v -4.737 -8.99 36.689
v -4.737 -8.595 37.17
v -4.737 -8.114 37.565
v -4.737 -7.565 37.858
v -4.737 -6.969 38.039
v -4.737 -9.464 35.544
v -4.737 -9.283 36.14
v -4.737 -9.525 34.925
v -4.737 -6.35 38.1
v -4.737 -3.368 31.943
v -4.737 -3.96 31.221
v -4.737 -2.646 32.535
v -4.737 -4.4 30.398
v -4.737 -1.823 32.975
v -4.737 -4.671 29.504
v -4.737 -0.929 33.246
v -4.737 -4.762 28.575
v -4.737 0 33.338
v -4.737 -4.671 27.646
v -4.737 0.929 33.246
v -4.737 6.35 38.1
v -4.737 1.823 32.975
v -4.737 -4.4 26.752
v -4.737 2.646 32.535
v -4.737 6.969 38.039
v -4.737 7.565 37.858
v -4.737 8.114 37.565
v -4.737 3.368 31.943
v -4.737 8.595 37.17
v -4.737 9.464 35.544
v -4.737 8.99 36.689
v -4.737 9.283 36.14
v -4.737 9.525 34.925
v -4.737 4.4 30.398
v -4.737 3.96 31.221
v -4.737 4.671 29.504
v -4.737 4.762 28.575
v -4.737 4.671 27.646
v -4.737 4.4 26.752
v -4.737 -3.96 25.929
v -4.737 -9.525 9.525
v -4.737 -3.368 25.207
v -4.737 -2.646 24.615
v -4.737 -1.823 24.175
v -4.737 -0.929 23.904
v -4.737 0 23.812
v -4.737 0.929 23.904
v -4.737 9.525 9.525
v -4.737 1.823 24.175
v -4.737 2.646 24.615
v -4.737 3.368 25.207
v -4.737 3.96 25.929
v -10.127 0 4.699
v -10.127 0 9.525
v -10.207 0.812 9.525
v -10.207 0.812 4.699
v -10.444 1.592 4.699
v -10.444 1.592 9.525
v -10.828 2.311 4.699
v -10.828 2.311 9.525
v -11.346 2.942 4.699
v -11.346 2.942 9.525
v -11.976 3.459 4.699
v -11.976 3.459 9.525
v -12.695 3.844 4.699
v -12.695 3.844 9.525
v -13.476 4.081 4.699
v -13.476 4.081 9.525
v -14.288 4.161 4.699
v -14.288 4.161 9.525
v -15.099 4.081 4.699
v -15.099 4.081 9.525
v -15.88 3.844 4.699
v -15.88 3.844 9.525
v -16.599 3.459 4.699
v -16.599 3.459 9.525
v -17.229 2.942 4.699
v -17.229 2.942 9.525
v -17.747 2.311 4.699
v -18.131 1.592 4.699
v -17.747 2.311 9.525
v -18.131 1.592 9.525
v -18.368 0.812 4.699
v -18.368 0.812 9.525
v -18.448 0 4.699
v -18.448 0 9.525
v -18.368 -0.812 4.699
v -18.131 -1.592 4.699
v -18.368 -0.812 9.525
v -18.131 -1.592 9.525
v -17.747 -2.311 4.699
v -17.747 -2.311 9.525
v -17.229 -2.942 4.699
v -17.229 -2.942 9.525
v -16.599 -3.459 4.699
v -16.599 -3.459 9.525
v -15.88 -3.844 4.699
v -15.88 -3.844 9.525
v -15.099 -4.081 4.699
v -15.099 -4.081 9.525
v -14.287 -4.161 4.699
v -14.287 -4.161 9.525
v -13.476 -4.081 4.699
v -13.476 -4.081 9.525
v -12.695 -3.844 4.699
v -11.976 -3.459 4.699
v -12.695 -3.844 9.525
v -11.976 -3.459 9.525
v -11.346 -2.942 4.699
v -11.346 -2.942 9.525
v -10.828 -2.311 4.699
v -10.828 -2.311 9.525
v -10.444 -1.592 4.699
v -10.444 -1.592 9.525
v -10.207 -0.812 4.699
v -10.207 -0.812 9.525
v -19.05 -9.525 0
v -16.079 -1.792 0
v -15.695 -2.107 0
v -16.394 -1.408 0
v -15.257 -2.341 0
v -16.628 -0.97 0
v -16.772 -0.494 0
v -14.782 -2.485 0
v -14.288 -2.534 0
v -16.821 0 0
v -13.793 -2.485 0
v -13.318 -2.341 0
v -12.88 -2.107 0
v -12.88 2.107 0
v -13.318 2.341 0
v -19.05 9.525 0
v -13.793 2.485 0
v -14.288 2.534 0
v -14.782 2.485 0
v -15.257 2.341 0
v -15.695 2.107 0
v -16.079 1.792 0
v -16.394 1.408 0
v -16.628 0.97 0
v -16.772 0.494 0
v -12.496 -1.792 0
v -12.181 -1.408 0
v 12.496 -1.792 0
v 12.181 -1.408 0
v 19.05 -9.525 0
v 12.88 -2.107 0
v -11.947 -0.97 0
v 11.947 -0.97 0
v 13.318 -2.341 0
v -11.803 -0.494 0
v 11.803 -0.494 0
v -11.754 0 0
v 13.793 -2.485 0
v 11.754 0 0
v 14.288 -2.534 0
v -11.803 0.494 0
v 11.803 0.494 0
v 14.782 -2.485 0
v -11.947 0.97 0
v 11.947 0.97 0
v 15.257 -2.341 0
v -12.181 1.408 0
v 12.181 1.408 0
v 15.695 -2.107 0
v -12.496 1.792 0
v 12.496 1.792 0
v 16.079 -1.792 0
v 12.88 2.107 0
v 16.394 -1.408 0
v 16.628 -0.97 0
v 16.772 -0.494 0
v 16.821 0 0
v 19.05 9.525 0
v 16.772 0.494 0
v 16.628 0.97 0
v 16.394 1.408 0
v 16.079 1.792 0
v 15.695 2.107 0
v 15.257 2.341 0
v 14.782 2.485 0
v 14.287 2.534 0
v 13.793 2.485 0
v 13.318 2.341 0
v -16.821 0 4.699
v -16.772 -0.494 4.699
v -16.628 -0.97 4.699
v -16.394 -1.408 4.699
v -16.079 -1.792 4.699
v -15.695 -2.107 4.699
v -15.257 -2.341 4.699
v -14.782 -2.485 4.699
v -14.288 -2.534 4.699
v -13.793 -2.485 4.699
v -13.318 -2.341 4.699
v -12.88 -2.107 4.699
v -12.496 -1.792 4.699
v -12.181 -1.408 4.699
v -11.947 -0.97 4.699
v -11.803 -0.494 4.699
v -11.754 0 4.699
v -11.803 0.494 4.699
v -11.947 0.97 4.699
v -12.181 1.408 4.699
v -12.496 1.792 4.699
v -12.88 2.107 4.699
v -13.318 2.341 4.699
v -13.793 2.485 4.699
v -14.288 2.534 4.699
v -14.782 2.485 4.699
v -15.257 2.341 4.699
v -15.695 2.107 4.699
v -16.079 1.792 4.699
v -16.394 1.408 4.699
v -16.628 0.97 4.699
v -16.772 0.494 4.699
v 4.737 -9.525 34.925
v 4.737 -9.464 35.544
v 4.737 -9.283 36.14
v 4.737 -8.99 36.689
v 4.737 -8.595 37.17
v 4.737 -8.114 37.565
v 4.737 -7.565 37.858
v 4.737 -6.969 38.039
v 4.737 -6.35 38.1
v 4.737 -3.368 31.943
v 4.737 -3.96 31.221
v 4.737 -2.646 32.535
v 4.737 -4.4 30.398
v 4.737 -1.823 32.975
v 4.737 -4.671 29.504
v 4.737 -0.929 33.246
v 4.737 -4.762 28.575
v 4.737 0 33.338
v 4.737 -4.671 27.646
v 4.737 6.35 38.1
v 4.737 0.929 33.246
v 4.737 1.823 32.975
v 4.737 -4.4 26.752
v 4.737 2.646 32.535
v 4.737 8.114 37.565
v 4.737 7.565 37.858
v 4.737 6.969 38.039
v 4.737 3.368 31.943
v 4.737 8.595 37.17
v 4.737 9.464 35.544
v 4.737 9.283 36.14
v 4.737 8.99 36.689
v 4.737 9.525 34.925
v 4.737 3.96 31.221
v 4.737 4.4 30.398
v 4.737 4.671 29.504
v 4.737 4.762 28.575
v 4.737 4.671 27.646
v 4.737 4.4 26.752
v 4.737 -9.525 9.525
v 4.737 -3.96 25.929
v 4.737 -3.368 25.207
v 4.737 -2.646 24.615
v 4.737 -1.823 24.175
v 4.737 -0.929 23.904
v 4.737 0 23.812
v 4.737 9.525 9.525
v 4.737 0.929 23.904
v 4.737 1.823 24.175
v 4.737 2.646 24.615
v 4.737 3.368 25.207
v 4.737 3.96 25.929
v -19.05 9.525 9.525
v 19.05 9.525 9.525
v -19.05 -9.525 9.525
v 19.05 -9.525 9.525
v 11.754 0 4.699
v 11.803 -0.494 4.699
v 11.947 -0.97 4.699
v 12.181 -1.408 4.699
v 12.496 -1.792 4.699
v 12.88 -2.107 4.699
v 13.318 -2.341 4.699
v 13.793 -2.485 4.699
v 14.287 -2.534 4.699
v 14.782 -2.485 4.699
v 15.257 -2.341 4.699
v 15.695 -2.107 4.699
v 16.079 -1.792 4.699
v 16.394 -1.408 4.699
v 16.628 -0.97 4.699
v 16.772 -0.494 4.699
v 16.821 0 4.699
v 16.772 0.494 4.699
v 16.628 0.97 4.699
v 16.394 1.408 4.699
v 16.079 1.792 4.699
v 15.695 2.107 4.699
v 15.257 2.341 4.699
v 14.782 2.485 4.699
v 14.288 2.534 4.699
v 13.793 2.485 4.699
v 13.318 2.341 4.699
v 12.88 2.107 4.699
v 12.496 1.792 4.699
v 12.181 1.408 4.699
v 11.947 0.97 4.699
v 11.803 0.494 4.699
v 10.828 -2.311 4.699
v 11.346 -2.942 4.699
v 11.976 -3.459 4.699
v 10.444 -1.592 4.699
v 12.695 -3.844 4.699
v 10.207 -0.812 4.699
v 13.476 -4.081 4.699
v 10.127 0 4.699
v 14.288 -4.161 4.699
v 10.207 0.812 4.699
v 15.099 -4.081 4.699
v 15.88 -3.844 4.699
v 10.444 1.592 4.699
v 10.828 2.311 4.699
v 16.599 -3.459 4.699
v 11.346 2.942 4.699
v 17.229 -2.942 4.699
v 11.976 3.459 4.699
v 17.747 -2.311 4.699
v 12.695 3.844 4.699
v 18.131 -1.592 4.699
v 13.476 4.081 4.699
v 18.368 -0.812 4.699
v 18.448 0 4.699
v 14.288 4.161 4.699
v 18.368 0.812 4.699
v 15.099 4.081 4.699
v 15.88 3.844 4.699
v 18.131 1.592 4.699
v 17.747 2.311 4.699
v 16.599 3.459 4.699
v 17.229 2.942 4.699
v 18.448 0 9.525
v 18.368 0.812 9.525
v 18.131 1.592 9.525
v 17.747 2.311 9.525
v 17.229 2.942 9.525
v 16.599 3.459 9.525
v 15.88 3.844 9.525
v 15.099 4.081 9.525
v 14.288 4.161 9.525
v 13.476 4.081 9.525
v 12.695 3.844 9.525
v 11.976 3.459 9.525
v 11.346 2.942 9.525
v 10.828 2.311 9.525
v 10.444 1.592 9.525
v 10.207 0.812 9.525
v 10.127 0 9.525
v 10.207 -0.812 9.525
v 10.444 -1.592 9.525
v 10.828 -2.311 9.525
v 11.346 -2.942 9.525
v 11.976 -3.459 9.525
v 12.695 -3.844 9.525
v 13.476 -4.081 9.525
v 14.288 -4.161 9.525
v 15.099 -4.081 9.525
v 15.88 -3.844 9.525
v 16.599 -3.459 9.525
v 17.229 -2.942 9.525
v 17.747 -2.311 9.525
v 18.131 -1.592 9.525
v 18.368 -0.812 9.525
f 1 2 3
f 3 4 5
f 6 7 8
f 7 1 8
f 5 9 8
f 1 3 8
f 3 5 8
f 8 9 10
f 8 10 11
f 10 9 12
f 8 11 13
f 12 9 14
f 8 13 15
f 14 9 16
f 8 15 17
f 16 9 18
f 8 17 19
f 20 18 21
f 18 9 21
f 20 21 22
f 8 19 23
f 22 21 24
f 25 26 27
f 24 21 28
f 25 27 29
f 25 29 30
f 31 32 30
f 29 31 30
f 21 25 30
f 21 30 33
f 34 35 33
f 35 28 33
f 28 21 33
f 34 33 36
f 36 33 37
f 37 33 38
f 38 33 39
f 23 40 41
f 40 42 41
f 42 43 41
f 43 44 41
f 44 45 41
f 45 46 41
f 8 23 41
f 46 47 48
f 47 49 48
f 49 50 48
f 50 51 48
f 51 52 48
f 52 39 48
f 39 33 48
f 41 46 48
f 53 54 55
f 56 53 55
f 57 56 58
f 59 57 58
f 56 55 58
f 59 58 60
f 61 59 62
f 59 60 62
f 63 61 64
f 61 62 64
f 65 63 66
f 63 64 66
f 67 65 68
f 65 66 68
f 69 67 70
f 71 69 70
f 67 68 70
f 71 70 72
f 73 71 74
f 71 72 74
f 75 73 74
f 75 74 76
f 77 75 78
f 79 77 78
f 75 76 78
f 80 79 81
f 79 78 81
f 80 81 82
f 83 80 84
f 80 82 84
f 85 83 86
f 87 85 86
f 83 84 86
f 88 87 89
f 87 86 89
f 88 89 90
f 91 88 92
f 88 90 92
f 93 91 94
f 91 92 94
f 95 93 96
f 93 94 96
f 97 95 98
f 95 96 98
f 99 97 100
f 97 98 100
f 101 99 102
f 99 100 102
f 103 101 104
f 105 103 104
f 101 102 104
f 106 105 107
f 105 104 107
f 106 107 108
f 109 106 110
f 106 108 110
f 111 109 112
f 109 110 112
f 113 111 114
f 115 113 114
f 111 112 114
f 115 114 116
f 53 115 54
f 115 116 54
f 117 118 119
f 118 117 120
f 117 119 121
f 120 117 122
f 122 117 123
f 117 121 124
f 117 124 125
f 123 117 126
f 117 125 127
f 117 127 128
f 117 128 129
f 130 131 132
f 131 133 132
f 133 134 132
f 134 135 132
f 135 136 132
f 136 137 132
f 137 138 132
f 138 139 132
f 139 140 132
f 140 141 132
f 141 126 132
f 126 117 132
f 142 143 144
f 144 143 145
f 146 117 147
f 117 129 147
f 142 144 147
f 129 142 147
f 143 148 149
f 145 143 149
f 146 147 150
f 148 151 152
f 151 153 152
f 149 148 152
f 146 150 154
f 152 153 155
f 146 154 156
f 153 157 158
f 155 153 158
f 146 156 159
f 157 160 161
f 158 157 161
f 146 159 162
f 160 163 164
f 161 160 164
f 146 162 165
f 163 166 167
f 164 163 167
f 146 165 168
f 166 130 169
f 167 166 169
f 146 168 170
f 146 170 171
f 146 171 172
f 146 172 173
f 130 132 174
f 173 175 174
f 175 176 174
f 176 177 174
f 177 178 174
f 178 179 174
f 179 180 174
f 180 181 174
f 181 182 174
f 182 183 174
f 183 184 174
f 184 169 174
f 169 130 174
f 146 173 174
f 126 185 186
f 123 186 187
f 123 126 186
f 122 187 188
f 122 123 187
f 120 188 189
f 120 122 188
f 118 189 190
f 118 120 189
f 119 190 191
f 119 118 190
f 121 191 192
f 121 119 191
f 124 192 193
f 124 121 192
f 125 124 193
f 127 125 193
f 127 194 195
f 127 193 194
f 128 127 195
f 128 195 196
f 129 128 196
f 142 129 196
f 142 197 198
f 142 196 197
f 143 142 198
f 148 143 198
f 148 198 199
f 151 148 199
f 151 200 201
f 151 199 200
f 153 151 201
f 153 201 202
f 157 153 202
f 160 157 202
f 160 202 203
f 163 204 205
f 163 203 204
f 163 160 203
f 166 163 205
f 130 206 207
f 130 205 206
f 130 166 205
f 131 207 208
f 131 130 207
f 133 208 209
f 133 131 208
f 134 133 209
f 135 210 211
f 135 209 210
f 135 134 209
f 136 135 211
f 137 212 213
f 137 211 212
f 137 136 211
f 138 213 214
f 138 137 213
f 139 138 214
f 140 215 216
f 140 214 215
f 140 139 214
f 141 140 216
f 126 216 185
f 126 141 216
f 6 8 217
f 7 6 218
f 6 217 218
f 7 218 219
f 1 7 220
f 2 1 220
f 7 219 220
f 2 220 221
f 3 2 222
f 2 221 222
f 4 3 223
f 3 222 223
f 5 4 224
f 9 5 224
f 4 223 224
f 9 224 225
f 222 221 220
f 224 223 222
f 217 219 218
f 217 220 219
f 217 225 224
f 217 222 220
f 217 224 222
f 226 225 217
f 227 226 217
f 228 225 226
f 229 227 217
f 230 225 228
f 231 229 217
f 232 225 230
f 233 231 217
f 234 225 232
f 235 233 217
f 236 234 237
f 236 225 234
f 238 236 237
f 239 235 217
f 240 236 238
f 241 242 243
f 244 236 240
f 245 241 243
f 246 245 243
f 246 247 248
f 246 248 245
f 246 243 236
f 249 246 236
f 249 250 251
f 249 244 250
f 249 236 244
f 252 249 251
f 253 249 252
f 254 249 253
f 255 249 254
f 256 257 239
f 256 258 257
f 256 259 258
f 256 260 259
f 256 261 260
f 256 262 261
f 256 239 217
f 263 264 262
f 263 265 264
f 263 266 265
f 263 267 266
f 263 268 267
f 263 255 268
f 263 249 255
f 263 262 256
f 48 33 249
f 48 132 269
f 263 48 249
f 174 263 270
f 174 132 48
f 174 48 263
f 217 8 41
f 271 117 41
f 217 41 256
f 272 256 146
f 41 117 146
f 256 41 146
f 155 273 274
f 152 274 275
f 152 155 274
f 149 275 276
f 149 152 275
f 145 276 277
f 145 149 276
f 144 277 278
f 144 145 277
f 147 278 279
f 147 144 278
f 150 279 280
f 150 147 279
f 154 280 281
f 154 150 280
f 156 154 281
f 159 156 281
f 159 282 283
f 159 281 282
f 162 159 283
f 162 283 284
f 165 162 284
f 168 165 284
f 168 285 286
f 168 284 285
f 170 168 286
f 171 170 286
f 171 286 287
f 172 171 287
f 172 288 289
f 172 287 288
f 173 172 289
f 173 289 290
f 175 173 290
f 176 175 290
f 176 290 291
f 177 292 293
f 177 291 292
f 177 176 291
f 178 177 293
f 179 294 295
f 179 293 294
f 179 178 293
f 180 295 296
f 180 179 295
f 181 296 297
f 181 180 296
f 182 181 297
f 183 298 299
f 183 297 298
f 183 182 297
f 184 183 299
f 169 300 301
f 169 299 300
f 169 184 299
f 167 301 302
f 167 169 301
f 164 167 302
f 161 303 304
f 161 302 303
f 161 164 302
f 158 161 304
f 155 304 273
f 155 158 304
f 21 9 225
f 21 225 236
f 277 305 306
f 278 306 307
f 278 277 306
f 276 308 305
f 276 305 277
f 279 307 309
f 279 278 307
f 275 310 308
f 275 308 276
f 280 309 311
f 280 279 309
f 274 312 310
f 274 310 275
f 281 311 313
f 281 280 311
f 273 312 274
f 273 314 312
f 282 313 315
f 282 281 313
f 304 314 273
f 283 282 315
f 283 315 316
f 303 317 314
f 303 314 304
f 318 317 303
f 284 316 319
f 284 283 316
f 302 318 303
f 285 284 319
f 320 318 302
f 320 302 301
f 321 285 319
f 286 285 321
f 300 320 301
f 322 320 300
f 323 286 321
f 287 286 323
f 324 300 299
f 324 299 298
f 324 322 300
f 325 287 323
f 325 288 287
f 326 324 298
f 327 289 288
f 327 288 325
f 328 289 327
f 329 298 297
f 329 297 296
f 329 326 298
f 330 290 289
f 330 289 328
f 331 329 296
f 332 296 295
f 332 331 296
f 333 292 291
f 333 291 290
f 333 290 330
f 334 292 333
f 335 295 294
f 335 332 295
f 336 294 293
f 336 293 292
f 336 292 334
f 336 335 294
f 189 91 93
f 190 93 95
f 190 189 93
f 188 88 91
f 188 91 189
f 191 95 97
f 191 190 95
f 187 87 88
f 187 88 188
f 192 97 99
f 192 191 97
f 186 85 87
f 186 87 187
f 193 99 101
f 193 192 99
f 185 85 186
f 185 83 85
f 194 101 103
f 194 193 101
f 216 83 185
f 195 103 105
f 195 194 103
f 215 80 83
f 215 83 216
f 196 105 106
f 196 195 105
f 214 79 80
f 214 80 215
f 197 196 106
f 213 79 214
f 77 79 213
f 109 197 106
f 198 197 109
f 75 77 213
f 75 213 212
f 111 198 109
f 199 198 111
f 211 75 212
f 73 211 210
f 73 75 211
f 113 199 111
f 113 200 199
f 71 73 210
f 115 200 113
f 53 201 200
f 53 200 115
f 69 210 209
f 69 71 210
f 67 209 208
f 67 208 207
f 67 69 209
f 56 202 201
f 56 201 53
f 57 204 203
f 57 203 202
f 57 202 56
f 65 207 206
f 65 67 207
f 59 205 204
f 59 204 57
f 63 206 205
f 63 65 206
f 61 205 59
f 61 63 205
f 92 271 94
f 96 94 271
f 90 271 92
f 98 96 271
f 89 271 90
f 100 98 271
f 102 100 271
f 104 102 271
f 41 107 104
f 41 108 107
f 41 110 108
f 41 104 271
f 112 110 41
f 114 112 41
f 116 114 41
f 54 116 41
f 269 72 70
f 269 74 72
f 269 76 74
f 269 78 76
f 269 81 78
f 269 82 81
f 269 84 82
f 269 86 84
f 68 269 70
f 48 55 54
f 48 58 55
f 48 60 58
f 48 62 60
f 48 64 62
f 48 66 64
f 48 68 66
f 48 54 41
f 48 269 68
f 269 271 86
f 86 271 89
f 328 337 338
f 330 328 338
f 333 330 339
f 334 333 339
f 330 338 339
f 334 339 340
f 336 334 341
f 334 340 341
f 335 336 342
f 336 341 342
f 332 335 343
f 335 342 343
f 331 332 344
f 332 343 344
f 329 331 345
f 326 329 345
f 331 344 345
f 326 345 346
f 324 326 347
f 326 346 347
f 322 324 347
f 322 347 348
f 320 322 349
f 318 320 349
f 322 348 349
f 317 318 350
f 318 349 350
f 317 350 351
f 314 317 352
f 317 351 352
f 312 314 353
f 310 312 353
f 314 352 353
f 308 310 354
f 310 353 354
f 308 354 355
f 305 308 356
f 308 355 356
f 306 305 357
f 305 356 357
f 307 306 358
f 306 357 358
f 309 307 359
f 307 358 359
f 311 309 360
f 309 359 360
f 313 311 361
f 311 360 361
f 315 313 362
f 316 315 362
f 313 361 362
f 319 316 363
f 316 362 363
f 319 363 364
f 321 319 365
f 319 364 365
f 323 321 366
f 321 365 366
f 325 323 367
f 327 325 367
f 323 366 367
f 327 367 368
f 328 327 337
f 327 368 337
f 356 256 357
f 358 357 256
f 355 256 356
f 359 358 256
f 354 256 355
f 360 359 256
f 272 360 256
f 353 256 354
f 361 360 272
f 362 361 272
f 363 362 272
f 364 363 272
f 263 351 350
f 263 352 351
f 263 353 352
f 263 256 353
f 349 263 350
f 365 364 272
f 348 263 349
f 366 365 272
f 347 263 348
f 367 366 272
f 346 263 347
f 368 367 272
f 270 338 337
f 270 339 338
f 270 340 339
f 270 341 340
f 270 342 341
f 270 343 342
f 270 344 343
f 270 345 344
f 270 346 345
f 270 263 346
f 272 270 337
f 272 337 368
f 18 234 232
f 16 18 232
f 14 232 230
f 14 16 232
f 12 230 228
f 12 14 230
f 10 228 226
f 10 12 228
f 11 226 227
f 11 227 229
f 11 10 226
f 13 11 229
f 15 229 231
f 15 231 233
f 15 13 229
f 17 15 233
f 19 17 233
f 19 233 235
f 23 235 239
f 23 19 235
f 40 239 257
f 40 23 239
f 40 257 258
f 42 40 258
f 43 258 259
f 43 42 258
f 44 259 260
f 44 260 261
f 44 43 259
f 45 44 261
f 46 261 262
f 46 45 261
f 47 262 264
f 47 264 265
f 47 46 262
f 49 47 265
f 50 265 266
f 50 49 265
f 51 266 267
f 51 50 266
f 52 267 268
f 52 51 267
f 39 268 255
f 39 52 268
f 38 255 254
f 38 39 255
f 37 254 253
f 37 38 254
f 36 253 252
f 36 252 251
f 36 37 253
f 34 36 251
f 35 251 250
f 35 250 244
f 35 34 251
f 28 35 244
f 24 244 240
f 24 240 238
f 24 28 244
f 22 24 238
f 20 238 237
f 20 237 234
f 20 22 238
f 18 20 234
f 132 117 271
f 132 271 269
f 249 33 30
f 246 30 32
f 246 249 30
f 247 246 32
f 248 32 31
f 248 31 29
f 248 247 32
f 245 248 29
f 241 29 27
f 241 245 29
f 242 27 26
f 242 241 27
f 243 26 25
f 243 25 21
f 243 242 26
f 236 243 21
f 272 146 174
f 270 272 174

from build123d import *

# Parameters (mm, degrees)
SKETCH1_W                = 38.1
SKETCH1_H                = 19.05
SKETCH1_R                = 2.53365
BOSS_EXTRUDE1_DEPTH      = 9.525
SKETCH2_R                = 4.16052
CUT_EXTRUDE1_DEPTH       = 4.826
BOSS_EXTRUDE2_DEPTH      = 4.7371
BOSS_EXTRUDE2_DEPTH_BACK = 4.7371
SKETCH3_W                = 28.575
SKETCH3_H                = 19.05
SKETCH3_R                = 4.7625
FILLET1_R                = 3.175


with BuildPart() as part:
    # Sketch1 → Boss-Extrude1 (new body)
    with BuildSketch(Plane.XY):
        Rectangle(SKETCH1_W, SKETCH1_H)
        with Locations(Location((-14.2875, 0, 0), (0, 0, 180))):
            Circle(SKETCH1_R, mode=Mode.SUBTRACT)
        with Locations(Location((14.2875, 0, 0), (0, 0, 180))):
            Circle(SKETCH1_R, mode=Mode.SUBTRACT)
    extrude(amount=BOSS_EXTRUDE1_DEPTH)

    # Sketch2 → Cut-Extrude1 (cut)
    with BuildSketch(Plane.XY.offset(9.525)):
        with Locations((-14.2875, 0)):
            Circle(SKETCH2_R)
        with Locations((14.2875, 0)):
            Circle(SKETCH2_R)
    extrude(amount=-CUT_EXTRUDE1_DEPTH, mode=Mode.SUBTRACT)

    # Sketch3 → Boss-Extrude2 (add, two sides: drawn at the far end of the back side and taken through both)
    with BuildSketch(Plane(origin=(0, 0, 0), x_dir=(0, 0, -1), z_dir=(1, 0, 0)).offset(-BOSS_EXTRUDE2_DEPTH_BACK)):
        with Locations((-23.8125, 0)):
            Rectangle(SKETCH3_W, SKETCH3_H)
        with Locations(Location((-28.575, 0, 0), (0, 0, 180))):
            Circle(SKETCH3_R, mode=Mode.SUBTRACT)
    extrude(amount=BOSS_EXTRUDE2_DEPTH + BOSS_EXTRUDE2_DEPTH_BACK)

    # Fillet1
    fillet1_edges = [part.edges().sort_by_distance(p)[0] for p in [
        (0, -9.525, 38.1),
        (0, 9.525, 38.1),
    ]]
    fillet(fillet1_edges, radius=FILLET1_R)


solid = part.part
